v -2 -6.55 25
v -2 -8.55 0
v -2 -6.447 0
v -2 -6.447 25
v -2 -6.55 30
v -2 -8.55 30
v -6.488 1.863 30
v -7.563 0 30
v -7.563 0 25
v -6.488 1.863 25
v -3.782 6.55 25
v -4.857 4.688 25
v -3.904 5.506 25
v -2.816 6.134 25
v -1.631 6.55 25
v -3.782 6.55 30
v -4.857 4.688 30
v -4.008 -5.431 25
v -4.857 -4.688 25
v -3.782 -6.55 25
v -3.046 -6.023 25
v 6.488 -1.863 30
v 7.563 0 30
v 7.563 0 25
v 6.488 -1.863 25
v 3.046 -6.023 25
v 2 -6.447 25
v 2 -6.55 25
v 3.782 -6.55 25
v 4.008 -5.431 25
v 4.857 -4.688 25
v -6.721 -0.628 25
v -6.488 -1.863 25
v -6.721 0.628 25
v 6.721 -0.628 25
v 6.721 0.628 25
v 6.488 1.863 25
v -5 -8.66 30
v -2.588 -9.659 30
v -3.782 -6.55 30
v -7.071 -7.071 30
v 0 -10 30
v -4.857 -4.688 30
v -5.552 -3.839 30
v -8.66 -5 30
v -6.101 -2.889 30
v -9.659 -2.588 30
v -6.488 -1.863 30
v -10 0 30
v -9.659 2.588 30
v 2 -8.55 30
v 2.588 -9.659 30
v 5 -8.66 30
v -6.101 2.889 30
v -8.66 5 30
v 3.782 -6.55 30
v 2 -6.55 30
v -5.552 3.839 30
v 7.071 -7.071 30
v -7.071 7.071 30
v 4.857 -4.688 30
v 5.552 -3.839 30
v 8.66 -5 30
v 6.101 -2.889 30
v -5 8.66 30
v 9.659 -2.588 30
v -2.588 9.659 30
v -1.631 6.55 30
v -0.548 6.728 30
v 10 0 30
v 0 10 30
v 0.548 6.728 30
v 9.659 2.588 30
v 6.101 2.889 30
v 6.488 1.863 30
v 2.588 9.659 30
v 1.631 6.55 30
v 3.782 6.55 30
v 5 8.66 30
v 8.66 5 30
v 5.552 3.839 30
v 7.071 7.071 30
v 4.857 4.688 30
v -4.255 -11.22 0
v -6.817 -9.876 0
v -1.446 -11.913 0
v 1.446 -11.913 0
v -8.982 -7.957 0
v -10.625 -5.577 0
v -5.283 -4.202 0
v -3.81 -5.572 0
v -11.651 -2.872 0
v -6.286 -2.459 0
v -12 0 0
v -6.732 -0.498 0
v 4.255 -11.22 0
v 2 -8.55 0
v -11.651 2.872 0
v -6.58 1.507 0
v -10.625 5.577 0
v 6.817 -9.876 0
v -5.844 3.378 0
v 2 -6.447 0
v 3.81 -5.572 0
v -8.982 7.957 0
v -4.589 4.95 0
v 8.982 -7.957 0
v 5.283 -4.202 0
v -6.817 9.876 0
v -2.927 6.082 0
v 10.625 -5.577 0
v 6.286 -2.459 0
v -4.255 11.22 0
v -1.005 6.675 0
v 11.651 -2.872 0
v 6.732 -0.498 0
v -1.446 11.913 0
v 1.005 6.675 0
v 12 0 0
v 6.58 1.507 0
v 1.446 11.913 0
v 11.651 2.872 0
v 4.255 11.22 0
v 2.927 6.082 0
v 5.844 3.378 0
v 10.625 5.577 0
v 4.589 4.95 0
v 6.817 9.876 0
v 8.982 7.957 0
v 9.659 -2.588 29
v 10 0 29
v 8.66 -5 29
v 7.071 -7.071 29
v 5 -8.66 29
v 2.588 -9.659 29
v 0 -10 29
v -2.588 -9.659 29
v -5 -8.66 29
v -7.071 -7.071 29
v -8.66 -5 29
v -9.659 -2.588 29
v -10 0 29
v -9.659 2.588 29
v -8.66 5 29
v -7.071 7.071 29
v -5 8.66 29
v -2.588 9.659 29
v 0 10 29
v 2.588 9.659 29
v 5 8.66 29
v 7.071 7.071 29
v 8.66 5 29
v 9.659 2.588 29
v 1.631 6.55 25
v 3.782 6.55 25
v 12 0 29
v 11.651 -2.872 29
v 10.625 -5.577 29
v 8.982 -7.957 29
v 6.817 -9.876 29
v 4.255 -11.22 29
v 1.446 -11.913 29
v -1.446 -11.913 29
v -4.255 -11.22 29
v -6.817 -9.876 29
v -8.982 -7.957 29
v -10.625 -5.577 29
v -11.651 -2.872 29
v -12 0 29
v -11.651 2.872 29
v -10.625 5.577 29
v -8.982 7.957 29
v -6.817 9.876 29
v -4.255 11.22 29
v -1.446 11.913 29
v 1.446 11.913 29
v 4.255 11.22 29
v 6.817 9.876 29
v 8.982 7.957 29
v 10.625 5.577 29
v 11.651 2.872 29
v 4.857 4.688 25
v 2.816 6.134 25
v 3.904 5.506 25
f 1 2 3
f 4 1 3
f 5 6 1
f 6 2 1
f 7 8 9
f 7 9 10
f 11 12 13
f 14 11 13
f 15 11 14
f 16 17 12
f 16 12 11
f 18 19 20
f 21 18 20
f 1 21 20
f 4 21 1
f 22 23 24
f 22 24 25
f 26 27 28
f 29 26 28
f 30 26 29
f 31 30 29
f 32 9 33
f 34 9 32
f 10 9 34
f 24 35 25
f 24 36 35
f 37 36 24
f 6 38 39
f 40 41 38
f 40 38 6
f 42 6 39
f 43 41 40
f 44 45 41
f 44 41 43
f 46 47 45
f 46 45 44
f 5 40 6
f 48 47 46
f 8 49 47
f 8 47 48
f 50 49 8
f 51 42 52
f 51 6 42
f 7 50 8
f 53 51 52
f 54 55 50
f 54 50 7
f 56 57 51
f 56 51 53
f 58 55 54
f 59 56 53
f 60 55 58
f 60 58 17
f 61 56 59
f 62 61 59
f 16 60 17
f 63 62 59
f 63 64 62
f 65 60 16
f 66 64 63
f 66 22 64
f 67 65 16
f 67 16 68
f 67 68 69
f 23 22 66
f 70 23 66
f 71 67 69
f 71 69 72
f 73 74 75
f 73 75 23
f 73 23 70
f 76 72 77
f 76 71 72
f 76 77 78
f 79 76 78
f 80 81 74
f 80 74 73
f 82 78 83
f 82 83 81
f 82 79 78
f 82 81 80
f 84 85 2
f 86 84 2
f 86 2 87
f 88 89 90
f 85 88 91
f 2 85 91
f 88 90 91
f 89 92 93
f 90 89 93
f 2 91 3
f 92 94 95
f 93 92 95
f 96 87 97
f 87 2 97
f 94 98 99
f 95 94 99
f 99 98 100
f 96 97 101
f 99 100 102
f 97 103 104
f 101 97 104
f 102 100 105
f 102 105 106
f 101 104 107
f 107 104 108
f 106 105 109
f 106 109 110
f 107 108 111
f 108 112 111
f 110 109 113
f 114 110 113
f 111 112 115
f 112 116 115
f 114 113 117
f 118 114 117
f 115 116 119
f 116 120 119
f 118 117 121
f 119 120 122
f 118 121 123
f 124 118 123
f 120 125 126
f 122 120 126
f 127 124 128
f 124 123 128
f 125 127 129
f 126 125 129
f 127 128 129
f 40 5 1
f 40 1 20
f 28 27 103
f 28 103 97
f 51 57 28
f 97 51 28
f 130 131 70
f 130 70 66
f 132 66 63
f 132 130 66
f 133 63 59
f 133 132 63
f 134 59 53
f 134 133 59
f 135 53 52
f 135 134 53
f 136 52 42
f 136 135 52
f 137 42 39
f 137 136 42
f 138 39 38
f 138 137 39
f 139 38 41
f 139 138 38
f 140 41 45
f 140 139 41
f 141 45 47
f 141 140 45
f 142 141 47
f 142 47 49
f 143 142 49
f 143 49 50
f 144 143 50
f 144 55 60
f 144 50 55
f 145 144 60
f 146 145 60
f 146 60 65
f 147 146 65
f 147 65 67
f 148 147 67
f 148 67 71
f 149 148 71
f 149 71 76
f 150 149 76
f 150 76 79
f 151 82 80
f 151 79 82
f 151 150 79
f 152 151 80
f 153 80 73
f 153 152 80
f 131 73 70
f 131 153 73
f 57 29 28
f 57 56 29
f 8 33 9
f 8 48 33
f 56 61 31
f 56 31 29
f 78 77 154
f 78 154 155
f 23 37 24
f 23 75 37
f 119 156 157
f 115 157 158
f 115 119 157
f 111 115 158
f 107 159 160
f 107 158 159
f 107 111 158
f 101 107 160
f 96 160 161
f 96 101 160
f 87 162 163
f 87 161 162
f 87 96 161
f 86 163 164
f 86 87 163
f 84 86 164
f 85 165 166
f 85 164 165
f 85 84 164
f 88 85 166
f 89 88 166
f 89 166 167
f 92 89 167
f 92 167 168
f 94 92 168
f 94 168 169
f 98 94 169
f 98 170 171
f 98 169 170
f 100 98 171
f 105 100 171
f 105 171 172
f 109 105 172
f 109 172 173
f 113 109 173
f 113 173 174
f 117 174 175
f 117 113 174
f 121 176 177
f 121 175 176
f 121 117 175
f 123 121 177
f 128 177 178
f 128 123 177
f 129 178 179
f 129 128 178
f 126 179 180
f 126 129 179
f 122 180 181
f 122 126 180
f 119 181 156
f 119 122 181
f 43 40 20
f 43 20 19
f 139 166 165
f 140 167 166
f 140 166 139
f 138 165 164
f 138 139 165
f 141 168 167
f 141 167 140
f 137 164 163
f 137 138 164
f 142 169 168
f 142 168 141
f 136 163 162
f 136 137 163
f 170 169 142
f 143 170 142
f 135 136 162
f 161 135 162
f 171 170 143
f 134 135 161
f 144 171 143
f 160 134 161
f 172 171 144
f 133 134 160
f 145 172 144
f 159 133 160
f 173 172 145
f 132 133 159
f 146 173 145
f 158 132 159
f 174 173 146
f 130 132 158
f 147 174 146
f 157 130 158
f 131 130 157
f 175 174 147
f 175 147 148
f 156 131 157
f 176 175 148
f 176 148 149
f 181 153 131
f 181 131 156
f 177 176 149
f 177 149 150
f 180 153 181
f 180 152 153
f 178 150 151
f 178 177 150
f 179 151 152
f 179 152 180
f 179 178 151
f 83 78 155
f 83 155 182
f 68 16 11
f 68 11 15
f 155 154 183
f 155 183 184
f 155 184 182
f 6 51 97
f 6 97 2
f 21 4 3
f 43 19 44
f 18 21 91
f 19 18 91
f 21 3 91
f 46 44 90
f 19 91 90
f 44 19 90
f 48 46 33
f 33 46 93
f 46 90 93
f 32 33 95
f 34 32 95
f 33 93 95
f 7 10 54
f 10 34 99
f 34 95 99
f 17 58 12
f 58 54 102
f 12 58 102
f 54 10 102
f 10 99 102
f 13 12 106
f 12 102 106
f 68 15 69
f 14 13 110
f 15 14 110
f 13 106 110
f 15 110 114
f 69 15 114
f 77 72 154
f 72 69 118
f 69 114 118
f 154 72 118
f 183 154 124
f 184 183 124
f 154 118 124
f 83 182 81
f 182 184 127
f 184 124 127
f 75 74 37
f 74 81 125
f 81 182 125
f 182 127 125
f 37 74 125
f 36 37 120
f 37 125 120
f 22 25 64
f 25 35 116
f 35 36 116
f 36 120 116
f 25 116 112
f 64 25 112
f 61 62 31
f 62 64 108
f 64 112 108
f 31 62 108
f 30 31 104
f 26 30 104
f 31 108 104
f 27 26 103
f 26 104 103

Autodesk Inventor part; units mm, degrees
ref_plane "YZ Plane" through (0, 0, 0) normal (1, 0, 0) x (0, 1, 0)
ref_plane "XZ Plane" through (0, 0, 0) normal (0, 1, 0) x (-1, 0, 0)
ref_plane "XY Plane" through (0, 0, 0) normal (0, 0, 1) x (1, 0, 0)
sketch "Sketch1" plane through (0, 0, 0) normal (0, 0, 1) x (1, 0, 0)
  circle A0 centre (0, 0) radius 6.75
  circle A1 centre (0, 0) radius 12
  dimension "d0" = 13.5
  dimension "d1" = 24
extrude "Extrusion1" add sketch "Sketch1" along normal blind 29
sketch "Sketch3" plane through (0, 0, 29) normal (0, 0, 1) x (1, 0, 0)
  circle A0 centre (0, 0) radius 10
  circle A1 centre (0, 0) radius 6.75 projected
  dimension "d7" = 20
extrude "Extrusion3" add sketch "Sketch3" along normal blind 1
sketch "Sketch4" plane through (0, 0, 30) normal (0, 0, 1) x (1, 0, 0)
  line L0 (3.7816, 6.55) -> (7.5633, 0)
  line L1 (7.5633, 0) -> (3.7816, -6.55)
  line L2 (3.7816, -6.55) -> (-3.7816, -6.55)
  line L3 (-3.7816, -6.55) -> (-7.5633, 0)
  line L4 (-7.5633, 0) -> (-3.7816, 6.55)
  line L5 (-3.7816, 6.55) -> (3.7816, 6.55)
  point P0 (0, 0)
  point P1 (0, 0)
  dimension "d10" = 13.1
extrude "Extrusion4" cut sketch "Sketch4" against normal blind 5
sketch "Sketch5" plane through (0, 0, 30) normal (0, 0, 1) x (1, 0, 0)
  line L0 (2, -8.55) -> (-2, -8.55)
  line L1 (-2, -8.55) -> (-2, -4.55)
  line L2 (-2, -4.55) -> (2, -4.55)
  line L3 (2, -4.55) -> (2, -8.55)
  line L4 (3.7816, -6.55) -> (-3.7816, -6.55) projected
  point P0 (0, 0)
  point P1 (0, -8.55)
  point P2 (-2, -6.55)
  point P3 (0, -6.55)
  dimension "d13" = 4
  dimension "d14" = 4
extrude "Extrusion5" cut sketch "Sketch5" against normal through all
properties part number "Inner Wheel Spacer"
